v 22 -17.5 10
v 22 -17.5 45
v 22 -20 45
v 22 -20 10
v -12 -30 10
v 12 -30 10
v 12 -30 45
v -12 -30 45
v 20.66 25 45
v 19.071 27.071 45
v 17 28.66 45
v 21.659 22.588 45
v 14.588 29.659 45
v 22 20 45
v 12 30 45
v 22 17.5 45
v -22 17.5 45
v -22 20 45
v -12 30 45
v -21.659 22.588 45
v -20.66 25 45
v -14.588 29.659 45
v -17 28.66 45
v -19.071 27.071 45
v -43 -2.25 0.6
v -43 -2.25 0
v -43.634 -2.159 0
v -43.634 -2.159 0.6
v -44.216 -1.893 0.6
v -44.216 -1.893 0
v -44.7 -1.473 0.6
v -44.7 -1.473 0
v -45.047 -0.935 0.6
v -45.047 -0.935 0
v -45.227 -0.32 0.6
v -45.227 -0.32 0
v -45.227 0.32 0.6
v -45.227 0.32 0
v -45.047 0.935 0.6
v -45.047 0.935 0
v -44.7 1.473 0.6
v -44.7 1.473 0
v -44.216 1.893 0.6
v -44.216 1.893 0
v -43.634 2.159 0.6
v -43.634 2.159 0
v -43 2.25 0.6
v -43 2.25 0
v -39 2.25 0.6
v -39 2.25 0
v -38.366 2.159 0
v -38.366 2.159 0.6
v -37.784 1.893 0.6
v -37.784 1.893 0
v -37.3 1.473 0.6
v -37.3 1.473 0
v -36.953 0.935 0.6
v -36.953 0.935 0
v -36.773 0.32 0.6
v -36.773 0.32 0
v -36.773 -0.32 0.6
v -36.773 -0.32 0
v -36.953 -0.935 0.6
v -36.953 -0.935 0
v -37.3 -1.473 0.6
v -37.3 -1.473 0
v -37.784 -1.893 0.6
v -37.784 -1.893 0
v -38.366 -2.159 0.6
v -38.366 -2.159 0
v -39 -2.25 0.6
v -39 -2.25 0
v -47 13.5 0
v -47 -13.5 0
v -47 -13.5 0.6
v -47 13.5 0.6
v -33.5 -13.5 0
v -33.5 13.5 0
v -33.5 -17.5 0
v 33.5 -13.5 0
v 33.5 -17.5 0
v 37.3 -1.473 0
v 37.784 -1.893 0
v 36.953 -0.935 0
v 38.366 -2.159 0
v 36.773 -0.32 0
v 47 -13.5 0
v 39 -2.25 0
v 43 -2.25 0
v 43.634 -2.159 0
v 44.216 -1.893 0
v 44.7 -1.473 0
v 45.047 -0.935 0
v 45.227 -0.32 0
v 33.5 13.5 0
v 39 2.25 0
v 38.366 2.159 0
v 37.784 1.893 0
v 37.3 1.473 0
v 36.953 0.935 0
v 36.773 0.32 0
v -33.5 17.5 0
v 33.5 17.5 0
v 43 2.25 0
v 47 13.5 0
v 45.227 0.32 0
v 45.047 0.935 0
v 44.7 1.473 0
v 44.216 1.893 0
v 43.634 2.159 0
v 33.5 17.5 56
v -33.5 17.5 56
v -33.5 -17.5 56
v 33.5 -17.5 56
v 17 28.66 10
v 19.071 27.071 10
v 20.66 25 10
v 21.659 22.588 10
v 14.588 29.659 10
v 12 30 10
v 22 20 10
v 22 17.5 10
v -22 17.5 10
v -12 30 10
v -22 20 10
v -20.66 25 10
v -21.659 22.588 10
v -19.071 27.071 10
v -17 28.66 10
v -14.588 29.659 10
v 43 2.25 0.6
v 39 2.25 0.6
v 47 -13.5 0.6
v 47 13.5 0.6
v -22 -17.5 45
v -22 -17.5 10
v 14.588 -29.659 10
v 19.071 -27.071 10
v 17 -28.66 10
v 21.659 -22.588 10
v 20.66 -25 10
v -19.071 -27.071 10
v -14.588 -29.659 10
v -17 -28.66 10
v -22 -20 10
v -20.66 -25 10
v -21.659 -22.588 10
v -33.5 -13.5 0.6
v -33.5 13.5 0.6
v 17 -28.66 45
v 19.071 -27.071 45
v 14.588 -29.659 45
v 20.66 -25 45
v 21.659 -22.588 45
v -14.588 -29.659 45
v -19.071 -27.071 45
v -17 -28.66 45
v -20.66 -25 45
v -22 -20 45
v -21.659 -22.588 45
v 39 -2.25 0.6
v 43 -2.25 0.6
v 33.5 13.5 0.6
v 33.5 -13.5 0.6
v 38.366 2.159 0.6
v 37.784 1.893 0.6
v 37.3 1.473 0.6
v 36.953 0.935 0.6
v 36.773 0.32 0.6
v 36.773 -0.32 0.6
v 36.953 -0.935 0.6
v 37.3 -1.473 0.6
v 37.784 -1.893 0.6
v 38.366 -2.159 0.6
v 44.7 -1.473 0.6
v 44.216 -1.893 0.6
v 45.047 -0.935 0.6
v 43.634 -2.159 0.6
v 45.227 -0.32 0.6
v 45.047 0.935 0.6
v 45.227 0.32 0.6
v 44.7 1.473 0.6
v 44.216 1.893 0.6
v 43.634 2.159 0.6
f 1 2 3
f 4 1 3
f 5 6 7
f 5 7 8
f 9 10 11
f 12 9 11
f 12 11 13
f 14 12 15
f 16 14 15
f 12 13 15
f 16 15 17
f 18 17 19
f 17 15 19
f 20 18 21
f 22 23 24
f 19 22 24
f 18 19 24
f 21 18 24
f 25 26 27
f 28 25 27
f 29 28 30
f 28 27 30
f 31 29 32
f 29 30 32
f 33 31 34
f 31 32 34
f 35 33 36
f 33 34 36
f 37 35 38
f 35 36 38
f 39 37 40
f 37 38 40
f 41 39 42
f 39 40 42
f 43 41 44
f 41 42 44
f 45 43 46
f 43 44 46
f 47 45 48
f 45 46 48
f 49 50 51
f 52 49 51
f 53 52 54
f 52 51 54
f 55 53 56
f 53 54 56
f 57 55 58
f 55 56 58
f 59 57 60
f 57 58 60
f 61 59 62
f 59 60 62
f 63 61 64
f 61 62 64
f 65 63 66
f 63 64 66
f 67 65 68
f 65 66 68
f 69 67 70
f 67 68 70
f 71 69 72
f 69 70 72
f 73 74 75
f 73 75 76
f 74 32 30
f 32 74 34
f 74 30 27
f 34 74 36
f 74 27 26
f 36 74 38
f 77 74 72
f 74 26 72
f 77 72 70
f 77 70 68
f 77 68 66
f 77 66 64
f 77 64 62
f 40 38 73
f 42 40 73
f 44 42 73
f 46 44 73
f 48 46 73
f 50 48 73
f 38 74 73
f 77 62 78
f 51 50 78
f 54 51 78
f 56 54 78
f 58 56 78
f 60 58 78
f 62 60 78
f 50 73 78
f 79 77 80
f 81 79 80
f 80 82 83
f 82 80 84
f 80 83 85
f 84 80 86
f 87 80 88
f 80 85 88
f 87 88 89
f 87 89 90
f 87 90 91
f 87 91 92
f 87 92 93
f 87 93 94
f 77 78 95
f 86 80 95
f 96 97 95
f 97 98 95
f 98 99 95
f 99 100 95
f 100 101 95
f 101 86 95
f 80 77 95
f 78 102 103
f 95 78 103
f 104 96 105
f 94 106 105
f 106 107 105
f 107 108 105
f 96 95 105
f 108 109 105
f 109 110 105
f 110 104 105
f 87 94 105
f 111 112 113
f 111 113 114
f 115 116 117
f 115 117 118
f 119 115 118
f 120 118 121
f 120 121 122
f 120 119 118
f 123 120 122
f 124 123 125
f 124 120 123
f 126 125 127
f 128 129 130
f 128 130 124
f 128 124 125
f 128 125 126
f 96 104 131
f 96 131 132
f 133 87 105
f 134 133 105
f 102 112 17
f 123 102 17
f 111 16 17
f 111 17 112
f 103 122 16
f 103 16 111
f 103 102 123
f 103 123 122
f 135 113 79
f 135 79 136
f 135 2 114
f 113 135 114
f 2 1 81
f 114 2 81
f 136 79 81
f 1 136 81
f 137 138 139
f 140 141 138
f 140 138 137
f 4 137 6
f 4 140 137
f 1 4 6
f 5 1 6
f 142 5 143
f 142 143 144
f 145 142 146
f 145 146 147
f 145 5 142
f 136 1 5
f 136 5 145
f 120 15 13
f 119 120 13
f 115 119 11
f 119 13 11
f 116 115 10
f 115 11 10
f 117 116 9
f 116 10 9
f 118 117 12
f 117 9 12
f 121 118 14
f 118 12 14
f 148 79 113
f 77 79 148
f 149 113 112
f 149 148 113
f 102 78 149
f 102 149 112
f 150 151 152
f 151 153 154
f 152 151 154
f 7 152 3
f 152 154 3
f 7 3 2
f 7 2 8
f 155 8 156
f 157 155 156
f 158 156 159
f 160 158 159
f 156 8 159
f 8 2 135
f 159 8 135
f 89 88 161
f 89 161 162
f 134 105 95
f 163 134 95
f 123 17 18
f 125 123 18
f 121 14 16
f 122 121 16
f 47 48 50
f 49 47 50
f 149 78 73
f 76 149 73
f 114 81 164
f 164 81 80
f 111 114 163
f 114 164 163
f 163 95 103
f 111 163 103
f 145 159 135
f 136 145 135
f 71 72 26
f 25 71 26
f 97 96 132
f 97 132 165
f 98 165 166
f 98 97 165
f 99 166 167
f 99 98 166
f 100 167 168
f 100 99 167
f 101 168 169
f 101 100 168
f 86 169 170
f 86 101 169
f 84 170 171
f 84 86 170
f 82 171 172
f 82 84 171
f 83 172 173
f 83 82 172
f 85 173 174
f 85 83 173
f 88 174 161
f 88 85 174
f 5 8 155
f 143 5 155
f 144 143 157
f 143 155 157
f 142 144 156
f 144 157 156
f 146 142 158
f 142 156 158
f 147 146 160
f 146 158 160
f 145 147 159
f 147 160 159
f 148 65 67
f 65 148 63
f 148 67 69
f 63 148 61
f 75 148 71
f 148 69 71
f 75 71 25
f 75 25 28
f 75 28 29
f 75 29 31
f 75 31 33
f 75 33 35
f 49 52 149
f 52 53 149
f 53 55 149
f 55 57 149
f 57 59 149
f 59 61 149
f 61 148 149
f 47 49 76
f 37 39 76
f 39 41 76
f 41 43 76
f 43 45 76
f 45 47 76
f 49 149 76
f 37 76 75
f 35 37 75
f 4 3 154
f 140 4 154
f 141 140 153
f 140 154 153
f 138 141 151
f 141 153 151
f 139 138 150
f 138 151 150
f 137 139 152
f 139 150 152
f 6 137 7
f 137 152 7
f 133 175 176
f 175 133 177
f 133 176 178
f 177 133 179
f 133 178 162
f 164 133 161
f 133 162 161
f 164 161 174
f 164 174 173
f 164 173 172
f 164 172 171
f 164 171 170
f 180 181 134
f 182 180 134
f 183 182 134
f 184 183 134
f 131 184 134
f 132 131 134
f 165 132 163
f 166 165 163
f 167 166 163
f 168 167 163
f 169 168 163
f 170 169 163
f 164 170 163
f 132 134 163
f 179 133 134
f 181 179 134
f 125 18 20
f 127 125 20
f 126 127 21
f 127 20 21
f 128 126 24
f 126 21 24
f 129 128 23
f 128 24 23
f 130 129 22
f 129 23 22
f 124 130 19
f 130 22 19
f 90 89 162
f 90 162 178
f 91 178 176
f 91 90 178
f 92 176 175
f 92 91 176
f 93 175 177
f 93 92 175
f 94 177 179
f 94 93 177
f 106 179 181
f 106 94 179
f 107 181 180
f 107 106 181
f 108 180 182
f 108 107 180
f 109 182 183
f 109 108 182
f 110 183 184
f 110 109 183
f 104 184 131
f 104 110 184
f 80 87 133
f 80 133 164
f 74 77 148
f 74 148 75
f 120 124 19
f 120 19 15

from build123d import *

# Parameters (mm, degrees)
SKETCH_1_W      = 67
SKETCH_1_H      = 35
EXTRUDE_1_DEPTH = 56
EXTRUDE_START   = -11
EXTRUDE_2_DEPTH = 35
SKETCH_3_W      = 13.5
SKETCH_3_H      = 27
EXTRUDE_3_DEPTH = 0.6


with BuildPart() as part:
    # 草图1 → 拉伸1 (new body)
    with BuildSketch(Plane.XY):
        Rectangle(SKETCH_1_W, SKETCH_1_H)
    extrude(amount=EXTRUDE_1_DEPTH)

    # 草图2 → 拉伸2 (add)
    with BuildSketch(Plane.XY.offset(56).offset(EXTRUDE_START)):
        with BuildLine():
            Line((-12, 30), (12, 30))
            ThreePointArc((12, 30), (19.071067812, 27.071067812), (22, 20))
            Line((22, 20), (22, -20))
            ThreePointArc((22, -20), (19.071067812, -27.071067812), (12, -30))
            Line((12, -30), (-12, -30))
            ThreePointArc((-12, -30), (-19.071067812, -27.071067812), (-22, -20))
            Line((-22, -20), (-22, 20))
            ThreePointArc((-22, 20), (-19.071067812, 27.071067812), (-12, 30))
        make_face()
    extrude(amount=-EXTRUDE_2_DEPTH)

    # 草图3 → 拉伸3 (add)
    # profile 1 of 2: a face of its own
    with BuildSketch(Plane(origin=(0, 0, 0), x_dir=(-1, 0, 0), z_dir=(0, 0, -1))):
        with Locations((-40.25, 0)):
            Rectangle(SKETCH_3_W, SKETCH_3_H)
        with BuildLine():
            Line((-43, 2.25), (-39, 2.25))
            ThreePointArc((-39, 2.25), (-36.75, 0), (-39, -2.25))
            Line((-39, -2.25), (-43, -2.25))
            ThreePointArc((-43, -2.25), (-45.25, 0), (-43, 2.25))
        make_face(mode=Mode.SUBTRACT)
    # profile 2 of 2: a face of its own
    with BuildSketch(Plane(origin=(0, 0, 0), x_dir=(-1, 0, 0), z_dir=(0, 0, -1))):
        with Locations((40.25, 0)):
            Rectangle(SKETCH_3_W, SKETCH_3_H)
        with BuildLine():
            Line((43, 2.25), (39, 2.25))
            ThreePointArc((39, 2.25), (36.75, 0), (39, -2.25))
            Line((39, -2.25), (43, -2.25))
            ThreePointArc((43, -2.25), (45.25, 0), (43, 2.25))
        make_face(mode=Mode.SUBTRACT)
    extrude(amount=-EXTRUDE_3_DEPTH)


solid = part.part
